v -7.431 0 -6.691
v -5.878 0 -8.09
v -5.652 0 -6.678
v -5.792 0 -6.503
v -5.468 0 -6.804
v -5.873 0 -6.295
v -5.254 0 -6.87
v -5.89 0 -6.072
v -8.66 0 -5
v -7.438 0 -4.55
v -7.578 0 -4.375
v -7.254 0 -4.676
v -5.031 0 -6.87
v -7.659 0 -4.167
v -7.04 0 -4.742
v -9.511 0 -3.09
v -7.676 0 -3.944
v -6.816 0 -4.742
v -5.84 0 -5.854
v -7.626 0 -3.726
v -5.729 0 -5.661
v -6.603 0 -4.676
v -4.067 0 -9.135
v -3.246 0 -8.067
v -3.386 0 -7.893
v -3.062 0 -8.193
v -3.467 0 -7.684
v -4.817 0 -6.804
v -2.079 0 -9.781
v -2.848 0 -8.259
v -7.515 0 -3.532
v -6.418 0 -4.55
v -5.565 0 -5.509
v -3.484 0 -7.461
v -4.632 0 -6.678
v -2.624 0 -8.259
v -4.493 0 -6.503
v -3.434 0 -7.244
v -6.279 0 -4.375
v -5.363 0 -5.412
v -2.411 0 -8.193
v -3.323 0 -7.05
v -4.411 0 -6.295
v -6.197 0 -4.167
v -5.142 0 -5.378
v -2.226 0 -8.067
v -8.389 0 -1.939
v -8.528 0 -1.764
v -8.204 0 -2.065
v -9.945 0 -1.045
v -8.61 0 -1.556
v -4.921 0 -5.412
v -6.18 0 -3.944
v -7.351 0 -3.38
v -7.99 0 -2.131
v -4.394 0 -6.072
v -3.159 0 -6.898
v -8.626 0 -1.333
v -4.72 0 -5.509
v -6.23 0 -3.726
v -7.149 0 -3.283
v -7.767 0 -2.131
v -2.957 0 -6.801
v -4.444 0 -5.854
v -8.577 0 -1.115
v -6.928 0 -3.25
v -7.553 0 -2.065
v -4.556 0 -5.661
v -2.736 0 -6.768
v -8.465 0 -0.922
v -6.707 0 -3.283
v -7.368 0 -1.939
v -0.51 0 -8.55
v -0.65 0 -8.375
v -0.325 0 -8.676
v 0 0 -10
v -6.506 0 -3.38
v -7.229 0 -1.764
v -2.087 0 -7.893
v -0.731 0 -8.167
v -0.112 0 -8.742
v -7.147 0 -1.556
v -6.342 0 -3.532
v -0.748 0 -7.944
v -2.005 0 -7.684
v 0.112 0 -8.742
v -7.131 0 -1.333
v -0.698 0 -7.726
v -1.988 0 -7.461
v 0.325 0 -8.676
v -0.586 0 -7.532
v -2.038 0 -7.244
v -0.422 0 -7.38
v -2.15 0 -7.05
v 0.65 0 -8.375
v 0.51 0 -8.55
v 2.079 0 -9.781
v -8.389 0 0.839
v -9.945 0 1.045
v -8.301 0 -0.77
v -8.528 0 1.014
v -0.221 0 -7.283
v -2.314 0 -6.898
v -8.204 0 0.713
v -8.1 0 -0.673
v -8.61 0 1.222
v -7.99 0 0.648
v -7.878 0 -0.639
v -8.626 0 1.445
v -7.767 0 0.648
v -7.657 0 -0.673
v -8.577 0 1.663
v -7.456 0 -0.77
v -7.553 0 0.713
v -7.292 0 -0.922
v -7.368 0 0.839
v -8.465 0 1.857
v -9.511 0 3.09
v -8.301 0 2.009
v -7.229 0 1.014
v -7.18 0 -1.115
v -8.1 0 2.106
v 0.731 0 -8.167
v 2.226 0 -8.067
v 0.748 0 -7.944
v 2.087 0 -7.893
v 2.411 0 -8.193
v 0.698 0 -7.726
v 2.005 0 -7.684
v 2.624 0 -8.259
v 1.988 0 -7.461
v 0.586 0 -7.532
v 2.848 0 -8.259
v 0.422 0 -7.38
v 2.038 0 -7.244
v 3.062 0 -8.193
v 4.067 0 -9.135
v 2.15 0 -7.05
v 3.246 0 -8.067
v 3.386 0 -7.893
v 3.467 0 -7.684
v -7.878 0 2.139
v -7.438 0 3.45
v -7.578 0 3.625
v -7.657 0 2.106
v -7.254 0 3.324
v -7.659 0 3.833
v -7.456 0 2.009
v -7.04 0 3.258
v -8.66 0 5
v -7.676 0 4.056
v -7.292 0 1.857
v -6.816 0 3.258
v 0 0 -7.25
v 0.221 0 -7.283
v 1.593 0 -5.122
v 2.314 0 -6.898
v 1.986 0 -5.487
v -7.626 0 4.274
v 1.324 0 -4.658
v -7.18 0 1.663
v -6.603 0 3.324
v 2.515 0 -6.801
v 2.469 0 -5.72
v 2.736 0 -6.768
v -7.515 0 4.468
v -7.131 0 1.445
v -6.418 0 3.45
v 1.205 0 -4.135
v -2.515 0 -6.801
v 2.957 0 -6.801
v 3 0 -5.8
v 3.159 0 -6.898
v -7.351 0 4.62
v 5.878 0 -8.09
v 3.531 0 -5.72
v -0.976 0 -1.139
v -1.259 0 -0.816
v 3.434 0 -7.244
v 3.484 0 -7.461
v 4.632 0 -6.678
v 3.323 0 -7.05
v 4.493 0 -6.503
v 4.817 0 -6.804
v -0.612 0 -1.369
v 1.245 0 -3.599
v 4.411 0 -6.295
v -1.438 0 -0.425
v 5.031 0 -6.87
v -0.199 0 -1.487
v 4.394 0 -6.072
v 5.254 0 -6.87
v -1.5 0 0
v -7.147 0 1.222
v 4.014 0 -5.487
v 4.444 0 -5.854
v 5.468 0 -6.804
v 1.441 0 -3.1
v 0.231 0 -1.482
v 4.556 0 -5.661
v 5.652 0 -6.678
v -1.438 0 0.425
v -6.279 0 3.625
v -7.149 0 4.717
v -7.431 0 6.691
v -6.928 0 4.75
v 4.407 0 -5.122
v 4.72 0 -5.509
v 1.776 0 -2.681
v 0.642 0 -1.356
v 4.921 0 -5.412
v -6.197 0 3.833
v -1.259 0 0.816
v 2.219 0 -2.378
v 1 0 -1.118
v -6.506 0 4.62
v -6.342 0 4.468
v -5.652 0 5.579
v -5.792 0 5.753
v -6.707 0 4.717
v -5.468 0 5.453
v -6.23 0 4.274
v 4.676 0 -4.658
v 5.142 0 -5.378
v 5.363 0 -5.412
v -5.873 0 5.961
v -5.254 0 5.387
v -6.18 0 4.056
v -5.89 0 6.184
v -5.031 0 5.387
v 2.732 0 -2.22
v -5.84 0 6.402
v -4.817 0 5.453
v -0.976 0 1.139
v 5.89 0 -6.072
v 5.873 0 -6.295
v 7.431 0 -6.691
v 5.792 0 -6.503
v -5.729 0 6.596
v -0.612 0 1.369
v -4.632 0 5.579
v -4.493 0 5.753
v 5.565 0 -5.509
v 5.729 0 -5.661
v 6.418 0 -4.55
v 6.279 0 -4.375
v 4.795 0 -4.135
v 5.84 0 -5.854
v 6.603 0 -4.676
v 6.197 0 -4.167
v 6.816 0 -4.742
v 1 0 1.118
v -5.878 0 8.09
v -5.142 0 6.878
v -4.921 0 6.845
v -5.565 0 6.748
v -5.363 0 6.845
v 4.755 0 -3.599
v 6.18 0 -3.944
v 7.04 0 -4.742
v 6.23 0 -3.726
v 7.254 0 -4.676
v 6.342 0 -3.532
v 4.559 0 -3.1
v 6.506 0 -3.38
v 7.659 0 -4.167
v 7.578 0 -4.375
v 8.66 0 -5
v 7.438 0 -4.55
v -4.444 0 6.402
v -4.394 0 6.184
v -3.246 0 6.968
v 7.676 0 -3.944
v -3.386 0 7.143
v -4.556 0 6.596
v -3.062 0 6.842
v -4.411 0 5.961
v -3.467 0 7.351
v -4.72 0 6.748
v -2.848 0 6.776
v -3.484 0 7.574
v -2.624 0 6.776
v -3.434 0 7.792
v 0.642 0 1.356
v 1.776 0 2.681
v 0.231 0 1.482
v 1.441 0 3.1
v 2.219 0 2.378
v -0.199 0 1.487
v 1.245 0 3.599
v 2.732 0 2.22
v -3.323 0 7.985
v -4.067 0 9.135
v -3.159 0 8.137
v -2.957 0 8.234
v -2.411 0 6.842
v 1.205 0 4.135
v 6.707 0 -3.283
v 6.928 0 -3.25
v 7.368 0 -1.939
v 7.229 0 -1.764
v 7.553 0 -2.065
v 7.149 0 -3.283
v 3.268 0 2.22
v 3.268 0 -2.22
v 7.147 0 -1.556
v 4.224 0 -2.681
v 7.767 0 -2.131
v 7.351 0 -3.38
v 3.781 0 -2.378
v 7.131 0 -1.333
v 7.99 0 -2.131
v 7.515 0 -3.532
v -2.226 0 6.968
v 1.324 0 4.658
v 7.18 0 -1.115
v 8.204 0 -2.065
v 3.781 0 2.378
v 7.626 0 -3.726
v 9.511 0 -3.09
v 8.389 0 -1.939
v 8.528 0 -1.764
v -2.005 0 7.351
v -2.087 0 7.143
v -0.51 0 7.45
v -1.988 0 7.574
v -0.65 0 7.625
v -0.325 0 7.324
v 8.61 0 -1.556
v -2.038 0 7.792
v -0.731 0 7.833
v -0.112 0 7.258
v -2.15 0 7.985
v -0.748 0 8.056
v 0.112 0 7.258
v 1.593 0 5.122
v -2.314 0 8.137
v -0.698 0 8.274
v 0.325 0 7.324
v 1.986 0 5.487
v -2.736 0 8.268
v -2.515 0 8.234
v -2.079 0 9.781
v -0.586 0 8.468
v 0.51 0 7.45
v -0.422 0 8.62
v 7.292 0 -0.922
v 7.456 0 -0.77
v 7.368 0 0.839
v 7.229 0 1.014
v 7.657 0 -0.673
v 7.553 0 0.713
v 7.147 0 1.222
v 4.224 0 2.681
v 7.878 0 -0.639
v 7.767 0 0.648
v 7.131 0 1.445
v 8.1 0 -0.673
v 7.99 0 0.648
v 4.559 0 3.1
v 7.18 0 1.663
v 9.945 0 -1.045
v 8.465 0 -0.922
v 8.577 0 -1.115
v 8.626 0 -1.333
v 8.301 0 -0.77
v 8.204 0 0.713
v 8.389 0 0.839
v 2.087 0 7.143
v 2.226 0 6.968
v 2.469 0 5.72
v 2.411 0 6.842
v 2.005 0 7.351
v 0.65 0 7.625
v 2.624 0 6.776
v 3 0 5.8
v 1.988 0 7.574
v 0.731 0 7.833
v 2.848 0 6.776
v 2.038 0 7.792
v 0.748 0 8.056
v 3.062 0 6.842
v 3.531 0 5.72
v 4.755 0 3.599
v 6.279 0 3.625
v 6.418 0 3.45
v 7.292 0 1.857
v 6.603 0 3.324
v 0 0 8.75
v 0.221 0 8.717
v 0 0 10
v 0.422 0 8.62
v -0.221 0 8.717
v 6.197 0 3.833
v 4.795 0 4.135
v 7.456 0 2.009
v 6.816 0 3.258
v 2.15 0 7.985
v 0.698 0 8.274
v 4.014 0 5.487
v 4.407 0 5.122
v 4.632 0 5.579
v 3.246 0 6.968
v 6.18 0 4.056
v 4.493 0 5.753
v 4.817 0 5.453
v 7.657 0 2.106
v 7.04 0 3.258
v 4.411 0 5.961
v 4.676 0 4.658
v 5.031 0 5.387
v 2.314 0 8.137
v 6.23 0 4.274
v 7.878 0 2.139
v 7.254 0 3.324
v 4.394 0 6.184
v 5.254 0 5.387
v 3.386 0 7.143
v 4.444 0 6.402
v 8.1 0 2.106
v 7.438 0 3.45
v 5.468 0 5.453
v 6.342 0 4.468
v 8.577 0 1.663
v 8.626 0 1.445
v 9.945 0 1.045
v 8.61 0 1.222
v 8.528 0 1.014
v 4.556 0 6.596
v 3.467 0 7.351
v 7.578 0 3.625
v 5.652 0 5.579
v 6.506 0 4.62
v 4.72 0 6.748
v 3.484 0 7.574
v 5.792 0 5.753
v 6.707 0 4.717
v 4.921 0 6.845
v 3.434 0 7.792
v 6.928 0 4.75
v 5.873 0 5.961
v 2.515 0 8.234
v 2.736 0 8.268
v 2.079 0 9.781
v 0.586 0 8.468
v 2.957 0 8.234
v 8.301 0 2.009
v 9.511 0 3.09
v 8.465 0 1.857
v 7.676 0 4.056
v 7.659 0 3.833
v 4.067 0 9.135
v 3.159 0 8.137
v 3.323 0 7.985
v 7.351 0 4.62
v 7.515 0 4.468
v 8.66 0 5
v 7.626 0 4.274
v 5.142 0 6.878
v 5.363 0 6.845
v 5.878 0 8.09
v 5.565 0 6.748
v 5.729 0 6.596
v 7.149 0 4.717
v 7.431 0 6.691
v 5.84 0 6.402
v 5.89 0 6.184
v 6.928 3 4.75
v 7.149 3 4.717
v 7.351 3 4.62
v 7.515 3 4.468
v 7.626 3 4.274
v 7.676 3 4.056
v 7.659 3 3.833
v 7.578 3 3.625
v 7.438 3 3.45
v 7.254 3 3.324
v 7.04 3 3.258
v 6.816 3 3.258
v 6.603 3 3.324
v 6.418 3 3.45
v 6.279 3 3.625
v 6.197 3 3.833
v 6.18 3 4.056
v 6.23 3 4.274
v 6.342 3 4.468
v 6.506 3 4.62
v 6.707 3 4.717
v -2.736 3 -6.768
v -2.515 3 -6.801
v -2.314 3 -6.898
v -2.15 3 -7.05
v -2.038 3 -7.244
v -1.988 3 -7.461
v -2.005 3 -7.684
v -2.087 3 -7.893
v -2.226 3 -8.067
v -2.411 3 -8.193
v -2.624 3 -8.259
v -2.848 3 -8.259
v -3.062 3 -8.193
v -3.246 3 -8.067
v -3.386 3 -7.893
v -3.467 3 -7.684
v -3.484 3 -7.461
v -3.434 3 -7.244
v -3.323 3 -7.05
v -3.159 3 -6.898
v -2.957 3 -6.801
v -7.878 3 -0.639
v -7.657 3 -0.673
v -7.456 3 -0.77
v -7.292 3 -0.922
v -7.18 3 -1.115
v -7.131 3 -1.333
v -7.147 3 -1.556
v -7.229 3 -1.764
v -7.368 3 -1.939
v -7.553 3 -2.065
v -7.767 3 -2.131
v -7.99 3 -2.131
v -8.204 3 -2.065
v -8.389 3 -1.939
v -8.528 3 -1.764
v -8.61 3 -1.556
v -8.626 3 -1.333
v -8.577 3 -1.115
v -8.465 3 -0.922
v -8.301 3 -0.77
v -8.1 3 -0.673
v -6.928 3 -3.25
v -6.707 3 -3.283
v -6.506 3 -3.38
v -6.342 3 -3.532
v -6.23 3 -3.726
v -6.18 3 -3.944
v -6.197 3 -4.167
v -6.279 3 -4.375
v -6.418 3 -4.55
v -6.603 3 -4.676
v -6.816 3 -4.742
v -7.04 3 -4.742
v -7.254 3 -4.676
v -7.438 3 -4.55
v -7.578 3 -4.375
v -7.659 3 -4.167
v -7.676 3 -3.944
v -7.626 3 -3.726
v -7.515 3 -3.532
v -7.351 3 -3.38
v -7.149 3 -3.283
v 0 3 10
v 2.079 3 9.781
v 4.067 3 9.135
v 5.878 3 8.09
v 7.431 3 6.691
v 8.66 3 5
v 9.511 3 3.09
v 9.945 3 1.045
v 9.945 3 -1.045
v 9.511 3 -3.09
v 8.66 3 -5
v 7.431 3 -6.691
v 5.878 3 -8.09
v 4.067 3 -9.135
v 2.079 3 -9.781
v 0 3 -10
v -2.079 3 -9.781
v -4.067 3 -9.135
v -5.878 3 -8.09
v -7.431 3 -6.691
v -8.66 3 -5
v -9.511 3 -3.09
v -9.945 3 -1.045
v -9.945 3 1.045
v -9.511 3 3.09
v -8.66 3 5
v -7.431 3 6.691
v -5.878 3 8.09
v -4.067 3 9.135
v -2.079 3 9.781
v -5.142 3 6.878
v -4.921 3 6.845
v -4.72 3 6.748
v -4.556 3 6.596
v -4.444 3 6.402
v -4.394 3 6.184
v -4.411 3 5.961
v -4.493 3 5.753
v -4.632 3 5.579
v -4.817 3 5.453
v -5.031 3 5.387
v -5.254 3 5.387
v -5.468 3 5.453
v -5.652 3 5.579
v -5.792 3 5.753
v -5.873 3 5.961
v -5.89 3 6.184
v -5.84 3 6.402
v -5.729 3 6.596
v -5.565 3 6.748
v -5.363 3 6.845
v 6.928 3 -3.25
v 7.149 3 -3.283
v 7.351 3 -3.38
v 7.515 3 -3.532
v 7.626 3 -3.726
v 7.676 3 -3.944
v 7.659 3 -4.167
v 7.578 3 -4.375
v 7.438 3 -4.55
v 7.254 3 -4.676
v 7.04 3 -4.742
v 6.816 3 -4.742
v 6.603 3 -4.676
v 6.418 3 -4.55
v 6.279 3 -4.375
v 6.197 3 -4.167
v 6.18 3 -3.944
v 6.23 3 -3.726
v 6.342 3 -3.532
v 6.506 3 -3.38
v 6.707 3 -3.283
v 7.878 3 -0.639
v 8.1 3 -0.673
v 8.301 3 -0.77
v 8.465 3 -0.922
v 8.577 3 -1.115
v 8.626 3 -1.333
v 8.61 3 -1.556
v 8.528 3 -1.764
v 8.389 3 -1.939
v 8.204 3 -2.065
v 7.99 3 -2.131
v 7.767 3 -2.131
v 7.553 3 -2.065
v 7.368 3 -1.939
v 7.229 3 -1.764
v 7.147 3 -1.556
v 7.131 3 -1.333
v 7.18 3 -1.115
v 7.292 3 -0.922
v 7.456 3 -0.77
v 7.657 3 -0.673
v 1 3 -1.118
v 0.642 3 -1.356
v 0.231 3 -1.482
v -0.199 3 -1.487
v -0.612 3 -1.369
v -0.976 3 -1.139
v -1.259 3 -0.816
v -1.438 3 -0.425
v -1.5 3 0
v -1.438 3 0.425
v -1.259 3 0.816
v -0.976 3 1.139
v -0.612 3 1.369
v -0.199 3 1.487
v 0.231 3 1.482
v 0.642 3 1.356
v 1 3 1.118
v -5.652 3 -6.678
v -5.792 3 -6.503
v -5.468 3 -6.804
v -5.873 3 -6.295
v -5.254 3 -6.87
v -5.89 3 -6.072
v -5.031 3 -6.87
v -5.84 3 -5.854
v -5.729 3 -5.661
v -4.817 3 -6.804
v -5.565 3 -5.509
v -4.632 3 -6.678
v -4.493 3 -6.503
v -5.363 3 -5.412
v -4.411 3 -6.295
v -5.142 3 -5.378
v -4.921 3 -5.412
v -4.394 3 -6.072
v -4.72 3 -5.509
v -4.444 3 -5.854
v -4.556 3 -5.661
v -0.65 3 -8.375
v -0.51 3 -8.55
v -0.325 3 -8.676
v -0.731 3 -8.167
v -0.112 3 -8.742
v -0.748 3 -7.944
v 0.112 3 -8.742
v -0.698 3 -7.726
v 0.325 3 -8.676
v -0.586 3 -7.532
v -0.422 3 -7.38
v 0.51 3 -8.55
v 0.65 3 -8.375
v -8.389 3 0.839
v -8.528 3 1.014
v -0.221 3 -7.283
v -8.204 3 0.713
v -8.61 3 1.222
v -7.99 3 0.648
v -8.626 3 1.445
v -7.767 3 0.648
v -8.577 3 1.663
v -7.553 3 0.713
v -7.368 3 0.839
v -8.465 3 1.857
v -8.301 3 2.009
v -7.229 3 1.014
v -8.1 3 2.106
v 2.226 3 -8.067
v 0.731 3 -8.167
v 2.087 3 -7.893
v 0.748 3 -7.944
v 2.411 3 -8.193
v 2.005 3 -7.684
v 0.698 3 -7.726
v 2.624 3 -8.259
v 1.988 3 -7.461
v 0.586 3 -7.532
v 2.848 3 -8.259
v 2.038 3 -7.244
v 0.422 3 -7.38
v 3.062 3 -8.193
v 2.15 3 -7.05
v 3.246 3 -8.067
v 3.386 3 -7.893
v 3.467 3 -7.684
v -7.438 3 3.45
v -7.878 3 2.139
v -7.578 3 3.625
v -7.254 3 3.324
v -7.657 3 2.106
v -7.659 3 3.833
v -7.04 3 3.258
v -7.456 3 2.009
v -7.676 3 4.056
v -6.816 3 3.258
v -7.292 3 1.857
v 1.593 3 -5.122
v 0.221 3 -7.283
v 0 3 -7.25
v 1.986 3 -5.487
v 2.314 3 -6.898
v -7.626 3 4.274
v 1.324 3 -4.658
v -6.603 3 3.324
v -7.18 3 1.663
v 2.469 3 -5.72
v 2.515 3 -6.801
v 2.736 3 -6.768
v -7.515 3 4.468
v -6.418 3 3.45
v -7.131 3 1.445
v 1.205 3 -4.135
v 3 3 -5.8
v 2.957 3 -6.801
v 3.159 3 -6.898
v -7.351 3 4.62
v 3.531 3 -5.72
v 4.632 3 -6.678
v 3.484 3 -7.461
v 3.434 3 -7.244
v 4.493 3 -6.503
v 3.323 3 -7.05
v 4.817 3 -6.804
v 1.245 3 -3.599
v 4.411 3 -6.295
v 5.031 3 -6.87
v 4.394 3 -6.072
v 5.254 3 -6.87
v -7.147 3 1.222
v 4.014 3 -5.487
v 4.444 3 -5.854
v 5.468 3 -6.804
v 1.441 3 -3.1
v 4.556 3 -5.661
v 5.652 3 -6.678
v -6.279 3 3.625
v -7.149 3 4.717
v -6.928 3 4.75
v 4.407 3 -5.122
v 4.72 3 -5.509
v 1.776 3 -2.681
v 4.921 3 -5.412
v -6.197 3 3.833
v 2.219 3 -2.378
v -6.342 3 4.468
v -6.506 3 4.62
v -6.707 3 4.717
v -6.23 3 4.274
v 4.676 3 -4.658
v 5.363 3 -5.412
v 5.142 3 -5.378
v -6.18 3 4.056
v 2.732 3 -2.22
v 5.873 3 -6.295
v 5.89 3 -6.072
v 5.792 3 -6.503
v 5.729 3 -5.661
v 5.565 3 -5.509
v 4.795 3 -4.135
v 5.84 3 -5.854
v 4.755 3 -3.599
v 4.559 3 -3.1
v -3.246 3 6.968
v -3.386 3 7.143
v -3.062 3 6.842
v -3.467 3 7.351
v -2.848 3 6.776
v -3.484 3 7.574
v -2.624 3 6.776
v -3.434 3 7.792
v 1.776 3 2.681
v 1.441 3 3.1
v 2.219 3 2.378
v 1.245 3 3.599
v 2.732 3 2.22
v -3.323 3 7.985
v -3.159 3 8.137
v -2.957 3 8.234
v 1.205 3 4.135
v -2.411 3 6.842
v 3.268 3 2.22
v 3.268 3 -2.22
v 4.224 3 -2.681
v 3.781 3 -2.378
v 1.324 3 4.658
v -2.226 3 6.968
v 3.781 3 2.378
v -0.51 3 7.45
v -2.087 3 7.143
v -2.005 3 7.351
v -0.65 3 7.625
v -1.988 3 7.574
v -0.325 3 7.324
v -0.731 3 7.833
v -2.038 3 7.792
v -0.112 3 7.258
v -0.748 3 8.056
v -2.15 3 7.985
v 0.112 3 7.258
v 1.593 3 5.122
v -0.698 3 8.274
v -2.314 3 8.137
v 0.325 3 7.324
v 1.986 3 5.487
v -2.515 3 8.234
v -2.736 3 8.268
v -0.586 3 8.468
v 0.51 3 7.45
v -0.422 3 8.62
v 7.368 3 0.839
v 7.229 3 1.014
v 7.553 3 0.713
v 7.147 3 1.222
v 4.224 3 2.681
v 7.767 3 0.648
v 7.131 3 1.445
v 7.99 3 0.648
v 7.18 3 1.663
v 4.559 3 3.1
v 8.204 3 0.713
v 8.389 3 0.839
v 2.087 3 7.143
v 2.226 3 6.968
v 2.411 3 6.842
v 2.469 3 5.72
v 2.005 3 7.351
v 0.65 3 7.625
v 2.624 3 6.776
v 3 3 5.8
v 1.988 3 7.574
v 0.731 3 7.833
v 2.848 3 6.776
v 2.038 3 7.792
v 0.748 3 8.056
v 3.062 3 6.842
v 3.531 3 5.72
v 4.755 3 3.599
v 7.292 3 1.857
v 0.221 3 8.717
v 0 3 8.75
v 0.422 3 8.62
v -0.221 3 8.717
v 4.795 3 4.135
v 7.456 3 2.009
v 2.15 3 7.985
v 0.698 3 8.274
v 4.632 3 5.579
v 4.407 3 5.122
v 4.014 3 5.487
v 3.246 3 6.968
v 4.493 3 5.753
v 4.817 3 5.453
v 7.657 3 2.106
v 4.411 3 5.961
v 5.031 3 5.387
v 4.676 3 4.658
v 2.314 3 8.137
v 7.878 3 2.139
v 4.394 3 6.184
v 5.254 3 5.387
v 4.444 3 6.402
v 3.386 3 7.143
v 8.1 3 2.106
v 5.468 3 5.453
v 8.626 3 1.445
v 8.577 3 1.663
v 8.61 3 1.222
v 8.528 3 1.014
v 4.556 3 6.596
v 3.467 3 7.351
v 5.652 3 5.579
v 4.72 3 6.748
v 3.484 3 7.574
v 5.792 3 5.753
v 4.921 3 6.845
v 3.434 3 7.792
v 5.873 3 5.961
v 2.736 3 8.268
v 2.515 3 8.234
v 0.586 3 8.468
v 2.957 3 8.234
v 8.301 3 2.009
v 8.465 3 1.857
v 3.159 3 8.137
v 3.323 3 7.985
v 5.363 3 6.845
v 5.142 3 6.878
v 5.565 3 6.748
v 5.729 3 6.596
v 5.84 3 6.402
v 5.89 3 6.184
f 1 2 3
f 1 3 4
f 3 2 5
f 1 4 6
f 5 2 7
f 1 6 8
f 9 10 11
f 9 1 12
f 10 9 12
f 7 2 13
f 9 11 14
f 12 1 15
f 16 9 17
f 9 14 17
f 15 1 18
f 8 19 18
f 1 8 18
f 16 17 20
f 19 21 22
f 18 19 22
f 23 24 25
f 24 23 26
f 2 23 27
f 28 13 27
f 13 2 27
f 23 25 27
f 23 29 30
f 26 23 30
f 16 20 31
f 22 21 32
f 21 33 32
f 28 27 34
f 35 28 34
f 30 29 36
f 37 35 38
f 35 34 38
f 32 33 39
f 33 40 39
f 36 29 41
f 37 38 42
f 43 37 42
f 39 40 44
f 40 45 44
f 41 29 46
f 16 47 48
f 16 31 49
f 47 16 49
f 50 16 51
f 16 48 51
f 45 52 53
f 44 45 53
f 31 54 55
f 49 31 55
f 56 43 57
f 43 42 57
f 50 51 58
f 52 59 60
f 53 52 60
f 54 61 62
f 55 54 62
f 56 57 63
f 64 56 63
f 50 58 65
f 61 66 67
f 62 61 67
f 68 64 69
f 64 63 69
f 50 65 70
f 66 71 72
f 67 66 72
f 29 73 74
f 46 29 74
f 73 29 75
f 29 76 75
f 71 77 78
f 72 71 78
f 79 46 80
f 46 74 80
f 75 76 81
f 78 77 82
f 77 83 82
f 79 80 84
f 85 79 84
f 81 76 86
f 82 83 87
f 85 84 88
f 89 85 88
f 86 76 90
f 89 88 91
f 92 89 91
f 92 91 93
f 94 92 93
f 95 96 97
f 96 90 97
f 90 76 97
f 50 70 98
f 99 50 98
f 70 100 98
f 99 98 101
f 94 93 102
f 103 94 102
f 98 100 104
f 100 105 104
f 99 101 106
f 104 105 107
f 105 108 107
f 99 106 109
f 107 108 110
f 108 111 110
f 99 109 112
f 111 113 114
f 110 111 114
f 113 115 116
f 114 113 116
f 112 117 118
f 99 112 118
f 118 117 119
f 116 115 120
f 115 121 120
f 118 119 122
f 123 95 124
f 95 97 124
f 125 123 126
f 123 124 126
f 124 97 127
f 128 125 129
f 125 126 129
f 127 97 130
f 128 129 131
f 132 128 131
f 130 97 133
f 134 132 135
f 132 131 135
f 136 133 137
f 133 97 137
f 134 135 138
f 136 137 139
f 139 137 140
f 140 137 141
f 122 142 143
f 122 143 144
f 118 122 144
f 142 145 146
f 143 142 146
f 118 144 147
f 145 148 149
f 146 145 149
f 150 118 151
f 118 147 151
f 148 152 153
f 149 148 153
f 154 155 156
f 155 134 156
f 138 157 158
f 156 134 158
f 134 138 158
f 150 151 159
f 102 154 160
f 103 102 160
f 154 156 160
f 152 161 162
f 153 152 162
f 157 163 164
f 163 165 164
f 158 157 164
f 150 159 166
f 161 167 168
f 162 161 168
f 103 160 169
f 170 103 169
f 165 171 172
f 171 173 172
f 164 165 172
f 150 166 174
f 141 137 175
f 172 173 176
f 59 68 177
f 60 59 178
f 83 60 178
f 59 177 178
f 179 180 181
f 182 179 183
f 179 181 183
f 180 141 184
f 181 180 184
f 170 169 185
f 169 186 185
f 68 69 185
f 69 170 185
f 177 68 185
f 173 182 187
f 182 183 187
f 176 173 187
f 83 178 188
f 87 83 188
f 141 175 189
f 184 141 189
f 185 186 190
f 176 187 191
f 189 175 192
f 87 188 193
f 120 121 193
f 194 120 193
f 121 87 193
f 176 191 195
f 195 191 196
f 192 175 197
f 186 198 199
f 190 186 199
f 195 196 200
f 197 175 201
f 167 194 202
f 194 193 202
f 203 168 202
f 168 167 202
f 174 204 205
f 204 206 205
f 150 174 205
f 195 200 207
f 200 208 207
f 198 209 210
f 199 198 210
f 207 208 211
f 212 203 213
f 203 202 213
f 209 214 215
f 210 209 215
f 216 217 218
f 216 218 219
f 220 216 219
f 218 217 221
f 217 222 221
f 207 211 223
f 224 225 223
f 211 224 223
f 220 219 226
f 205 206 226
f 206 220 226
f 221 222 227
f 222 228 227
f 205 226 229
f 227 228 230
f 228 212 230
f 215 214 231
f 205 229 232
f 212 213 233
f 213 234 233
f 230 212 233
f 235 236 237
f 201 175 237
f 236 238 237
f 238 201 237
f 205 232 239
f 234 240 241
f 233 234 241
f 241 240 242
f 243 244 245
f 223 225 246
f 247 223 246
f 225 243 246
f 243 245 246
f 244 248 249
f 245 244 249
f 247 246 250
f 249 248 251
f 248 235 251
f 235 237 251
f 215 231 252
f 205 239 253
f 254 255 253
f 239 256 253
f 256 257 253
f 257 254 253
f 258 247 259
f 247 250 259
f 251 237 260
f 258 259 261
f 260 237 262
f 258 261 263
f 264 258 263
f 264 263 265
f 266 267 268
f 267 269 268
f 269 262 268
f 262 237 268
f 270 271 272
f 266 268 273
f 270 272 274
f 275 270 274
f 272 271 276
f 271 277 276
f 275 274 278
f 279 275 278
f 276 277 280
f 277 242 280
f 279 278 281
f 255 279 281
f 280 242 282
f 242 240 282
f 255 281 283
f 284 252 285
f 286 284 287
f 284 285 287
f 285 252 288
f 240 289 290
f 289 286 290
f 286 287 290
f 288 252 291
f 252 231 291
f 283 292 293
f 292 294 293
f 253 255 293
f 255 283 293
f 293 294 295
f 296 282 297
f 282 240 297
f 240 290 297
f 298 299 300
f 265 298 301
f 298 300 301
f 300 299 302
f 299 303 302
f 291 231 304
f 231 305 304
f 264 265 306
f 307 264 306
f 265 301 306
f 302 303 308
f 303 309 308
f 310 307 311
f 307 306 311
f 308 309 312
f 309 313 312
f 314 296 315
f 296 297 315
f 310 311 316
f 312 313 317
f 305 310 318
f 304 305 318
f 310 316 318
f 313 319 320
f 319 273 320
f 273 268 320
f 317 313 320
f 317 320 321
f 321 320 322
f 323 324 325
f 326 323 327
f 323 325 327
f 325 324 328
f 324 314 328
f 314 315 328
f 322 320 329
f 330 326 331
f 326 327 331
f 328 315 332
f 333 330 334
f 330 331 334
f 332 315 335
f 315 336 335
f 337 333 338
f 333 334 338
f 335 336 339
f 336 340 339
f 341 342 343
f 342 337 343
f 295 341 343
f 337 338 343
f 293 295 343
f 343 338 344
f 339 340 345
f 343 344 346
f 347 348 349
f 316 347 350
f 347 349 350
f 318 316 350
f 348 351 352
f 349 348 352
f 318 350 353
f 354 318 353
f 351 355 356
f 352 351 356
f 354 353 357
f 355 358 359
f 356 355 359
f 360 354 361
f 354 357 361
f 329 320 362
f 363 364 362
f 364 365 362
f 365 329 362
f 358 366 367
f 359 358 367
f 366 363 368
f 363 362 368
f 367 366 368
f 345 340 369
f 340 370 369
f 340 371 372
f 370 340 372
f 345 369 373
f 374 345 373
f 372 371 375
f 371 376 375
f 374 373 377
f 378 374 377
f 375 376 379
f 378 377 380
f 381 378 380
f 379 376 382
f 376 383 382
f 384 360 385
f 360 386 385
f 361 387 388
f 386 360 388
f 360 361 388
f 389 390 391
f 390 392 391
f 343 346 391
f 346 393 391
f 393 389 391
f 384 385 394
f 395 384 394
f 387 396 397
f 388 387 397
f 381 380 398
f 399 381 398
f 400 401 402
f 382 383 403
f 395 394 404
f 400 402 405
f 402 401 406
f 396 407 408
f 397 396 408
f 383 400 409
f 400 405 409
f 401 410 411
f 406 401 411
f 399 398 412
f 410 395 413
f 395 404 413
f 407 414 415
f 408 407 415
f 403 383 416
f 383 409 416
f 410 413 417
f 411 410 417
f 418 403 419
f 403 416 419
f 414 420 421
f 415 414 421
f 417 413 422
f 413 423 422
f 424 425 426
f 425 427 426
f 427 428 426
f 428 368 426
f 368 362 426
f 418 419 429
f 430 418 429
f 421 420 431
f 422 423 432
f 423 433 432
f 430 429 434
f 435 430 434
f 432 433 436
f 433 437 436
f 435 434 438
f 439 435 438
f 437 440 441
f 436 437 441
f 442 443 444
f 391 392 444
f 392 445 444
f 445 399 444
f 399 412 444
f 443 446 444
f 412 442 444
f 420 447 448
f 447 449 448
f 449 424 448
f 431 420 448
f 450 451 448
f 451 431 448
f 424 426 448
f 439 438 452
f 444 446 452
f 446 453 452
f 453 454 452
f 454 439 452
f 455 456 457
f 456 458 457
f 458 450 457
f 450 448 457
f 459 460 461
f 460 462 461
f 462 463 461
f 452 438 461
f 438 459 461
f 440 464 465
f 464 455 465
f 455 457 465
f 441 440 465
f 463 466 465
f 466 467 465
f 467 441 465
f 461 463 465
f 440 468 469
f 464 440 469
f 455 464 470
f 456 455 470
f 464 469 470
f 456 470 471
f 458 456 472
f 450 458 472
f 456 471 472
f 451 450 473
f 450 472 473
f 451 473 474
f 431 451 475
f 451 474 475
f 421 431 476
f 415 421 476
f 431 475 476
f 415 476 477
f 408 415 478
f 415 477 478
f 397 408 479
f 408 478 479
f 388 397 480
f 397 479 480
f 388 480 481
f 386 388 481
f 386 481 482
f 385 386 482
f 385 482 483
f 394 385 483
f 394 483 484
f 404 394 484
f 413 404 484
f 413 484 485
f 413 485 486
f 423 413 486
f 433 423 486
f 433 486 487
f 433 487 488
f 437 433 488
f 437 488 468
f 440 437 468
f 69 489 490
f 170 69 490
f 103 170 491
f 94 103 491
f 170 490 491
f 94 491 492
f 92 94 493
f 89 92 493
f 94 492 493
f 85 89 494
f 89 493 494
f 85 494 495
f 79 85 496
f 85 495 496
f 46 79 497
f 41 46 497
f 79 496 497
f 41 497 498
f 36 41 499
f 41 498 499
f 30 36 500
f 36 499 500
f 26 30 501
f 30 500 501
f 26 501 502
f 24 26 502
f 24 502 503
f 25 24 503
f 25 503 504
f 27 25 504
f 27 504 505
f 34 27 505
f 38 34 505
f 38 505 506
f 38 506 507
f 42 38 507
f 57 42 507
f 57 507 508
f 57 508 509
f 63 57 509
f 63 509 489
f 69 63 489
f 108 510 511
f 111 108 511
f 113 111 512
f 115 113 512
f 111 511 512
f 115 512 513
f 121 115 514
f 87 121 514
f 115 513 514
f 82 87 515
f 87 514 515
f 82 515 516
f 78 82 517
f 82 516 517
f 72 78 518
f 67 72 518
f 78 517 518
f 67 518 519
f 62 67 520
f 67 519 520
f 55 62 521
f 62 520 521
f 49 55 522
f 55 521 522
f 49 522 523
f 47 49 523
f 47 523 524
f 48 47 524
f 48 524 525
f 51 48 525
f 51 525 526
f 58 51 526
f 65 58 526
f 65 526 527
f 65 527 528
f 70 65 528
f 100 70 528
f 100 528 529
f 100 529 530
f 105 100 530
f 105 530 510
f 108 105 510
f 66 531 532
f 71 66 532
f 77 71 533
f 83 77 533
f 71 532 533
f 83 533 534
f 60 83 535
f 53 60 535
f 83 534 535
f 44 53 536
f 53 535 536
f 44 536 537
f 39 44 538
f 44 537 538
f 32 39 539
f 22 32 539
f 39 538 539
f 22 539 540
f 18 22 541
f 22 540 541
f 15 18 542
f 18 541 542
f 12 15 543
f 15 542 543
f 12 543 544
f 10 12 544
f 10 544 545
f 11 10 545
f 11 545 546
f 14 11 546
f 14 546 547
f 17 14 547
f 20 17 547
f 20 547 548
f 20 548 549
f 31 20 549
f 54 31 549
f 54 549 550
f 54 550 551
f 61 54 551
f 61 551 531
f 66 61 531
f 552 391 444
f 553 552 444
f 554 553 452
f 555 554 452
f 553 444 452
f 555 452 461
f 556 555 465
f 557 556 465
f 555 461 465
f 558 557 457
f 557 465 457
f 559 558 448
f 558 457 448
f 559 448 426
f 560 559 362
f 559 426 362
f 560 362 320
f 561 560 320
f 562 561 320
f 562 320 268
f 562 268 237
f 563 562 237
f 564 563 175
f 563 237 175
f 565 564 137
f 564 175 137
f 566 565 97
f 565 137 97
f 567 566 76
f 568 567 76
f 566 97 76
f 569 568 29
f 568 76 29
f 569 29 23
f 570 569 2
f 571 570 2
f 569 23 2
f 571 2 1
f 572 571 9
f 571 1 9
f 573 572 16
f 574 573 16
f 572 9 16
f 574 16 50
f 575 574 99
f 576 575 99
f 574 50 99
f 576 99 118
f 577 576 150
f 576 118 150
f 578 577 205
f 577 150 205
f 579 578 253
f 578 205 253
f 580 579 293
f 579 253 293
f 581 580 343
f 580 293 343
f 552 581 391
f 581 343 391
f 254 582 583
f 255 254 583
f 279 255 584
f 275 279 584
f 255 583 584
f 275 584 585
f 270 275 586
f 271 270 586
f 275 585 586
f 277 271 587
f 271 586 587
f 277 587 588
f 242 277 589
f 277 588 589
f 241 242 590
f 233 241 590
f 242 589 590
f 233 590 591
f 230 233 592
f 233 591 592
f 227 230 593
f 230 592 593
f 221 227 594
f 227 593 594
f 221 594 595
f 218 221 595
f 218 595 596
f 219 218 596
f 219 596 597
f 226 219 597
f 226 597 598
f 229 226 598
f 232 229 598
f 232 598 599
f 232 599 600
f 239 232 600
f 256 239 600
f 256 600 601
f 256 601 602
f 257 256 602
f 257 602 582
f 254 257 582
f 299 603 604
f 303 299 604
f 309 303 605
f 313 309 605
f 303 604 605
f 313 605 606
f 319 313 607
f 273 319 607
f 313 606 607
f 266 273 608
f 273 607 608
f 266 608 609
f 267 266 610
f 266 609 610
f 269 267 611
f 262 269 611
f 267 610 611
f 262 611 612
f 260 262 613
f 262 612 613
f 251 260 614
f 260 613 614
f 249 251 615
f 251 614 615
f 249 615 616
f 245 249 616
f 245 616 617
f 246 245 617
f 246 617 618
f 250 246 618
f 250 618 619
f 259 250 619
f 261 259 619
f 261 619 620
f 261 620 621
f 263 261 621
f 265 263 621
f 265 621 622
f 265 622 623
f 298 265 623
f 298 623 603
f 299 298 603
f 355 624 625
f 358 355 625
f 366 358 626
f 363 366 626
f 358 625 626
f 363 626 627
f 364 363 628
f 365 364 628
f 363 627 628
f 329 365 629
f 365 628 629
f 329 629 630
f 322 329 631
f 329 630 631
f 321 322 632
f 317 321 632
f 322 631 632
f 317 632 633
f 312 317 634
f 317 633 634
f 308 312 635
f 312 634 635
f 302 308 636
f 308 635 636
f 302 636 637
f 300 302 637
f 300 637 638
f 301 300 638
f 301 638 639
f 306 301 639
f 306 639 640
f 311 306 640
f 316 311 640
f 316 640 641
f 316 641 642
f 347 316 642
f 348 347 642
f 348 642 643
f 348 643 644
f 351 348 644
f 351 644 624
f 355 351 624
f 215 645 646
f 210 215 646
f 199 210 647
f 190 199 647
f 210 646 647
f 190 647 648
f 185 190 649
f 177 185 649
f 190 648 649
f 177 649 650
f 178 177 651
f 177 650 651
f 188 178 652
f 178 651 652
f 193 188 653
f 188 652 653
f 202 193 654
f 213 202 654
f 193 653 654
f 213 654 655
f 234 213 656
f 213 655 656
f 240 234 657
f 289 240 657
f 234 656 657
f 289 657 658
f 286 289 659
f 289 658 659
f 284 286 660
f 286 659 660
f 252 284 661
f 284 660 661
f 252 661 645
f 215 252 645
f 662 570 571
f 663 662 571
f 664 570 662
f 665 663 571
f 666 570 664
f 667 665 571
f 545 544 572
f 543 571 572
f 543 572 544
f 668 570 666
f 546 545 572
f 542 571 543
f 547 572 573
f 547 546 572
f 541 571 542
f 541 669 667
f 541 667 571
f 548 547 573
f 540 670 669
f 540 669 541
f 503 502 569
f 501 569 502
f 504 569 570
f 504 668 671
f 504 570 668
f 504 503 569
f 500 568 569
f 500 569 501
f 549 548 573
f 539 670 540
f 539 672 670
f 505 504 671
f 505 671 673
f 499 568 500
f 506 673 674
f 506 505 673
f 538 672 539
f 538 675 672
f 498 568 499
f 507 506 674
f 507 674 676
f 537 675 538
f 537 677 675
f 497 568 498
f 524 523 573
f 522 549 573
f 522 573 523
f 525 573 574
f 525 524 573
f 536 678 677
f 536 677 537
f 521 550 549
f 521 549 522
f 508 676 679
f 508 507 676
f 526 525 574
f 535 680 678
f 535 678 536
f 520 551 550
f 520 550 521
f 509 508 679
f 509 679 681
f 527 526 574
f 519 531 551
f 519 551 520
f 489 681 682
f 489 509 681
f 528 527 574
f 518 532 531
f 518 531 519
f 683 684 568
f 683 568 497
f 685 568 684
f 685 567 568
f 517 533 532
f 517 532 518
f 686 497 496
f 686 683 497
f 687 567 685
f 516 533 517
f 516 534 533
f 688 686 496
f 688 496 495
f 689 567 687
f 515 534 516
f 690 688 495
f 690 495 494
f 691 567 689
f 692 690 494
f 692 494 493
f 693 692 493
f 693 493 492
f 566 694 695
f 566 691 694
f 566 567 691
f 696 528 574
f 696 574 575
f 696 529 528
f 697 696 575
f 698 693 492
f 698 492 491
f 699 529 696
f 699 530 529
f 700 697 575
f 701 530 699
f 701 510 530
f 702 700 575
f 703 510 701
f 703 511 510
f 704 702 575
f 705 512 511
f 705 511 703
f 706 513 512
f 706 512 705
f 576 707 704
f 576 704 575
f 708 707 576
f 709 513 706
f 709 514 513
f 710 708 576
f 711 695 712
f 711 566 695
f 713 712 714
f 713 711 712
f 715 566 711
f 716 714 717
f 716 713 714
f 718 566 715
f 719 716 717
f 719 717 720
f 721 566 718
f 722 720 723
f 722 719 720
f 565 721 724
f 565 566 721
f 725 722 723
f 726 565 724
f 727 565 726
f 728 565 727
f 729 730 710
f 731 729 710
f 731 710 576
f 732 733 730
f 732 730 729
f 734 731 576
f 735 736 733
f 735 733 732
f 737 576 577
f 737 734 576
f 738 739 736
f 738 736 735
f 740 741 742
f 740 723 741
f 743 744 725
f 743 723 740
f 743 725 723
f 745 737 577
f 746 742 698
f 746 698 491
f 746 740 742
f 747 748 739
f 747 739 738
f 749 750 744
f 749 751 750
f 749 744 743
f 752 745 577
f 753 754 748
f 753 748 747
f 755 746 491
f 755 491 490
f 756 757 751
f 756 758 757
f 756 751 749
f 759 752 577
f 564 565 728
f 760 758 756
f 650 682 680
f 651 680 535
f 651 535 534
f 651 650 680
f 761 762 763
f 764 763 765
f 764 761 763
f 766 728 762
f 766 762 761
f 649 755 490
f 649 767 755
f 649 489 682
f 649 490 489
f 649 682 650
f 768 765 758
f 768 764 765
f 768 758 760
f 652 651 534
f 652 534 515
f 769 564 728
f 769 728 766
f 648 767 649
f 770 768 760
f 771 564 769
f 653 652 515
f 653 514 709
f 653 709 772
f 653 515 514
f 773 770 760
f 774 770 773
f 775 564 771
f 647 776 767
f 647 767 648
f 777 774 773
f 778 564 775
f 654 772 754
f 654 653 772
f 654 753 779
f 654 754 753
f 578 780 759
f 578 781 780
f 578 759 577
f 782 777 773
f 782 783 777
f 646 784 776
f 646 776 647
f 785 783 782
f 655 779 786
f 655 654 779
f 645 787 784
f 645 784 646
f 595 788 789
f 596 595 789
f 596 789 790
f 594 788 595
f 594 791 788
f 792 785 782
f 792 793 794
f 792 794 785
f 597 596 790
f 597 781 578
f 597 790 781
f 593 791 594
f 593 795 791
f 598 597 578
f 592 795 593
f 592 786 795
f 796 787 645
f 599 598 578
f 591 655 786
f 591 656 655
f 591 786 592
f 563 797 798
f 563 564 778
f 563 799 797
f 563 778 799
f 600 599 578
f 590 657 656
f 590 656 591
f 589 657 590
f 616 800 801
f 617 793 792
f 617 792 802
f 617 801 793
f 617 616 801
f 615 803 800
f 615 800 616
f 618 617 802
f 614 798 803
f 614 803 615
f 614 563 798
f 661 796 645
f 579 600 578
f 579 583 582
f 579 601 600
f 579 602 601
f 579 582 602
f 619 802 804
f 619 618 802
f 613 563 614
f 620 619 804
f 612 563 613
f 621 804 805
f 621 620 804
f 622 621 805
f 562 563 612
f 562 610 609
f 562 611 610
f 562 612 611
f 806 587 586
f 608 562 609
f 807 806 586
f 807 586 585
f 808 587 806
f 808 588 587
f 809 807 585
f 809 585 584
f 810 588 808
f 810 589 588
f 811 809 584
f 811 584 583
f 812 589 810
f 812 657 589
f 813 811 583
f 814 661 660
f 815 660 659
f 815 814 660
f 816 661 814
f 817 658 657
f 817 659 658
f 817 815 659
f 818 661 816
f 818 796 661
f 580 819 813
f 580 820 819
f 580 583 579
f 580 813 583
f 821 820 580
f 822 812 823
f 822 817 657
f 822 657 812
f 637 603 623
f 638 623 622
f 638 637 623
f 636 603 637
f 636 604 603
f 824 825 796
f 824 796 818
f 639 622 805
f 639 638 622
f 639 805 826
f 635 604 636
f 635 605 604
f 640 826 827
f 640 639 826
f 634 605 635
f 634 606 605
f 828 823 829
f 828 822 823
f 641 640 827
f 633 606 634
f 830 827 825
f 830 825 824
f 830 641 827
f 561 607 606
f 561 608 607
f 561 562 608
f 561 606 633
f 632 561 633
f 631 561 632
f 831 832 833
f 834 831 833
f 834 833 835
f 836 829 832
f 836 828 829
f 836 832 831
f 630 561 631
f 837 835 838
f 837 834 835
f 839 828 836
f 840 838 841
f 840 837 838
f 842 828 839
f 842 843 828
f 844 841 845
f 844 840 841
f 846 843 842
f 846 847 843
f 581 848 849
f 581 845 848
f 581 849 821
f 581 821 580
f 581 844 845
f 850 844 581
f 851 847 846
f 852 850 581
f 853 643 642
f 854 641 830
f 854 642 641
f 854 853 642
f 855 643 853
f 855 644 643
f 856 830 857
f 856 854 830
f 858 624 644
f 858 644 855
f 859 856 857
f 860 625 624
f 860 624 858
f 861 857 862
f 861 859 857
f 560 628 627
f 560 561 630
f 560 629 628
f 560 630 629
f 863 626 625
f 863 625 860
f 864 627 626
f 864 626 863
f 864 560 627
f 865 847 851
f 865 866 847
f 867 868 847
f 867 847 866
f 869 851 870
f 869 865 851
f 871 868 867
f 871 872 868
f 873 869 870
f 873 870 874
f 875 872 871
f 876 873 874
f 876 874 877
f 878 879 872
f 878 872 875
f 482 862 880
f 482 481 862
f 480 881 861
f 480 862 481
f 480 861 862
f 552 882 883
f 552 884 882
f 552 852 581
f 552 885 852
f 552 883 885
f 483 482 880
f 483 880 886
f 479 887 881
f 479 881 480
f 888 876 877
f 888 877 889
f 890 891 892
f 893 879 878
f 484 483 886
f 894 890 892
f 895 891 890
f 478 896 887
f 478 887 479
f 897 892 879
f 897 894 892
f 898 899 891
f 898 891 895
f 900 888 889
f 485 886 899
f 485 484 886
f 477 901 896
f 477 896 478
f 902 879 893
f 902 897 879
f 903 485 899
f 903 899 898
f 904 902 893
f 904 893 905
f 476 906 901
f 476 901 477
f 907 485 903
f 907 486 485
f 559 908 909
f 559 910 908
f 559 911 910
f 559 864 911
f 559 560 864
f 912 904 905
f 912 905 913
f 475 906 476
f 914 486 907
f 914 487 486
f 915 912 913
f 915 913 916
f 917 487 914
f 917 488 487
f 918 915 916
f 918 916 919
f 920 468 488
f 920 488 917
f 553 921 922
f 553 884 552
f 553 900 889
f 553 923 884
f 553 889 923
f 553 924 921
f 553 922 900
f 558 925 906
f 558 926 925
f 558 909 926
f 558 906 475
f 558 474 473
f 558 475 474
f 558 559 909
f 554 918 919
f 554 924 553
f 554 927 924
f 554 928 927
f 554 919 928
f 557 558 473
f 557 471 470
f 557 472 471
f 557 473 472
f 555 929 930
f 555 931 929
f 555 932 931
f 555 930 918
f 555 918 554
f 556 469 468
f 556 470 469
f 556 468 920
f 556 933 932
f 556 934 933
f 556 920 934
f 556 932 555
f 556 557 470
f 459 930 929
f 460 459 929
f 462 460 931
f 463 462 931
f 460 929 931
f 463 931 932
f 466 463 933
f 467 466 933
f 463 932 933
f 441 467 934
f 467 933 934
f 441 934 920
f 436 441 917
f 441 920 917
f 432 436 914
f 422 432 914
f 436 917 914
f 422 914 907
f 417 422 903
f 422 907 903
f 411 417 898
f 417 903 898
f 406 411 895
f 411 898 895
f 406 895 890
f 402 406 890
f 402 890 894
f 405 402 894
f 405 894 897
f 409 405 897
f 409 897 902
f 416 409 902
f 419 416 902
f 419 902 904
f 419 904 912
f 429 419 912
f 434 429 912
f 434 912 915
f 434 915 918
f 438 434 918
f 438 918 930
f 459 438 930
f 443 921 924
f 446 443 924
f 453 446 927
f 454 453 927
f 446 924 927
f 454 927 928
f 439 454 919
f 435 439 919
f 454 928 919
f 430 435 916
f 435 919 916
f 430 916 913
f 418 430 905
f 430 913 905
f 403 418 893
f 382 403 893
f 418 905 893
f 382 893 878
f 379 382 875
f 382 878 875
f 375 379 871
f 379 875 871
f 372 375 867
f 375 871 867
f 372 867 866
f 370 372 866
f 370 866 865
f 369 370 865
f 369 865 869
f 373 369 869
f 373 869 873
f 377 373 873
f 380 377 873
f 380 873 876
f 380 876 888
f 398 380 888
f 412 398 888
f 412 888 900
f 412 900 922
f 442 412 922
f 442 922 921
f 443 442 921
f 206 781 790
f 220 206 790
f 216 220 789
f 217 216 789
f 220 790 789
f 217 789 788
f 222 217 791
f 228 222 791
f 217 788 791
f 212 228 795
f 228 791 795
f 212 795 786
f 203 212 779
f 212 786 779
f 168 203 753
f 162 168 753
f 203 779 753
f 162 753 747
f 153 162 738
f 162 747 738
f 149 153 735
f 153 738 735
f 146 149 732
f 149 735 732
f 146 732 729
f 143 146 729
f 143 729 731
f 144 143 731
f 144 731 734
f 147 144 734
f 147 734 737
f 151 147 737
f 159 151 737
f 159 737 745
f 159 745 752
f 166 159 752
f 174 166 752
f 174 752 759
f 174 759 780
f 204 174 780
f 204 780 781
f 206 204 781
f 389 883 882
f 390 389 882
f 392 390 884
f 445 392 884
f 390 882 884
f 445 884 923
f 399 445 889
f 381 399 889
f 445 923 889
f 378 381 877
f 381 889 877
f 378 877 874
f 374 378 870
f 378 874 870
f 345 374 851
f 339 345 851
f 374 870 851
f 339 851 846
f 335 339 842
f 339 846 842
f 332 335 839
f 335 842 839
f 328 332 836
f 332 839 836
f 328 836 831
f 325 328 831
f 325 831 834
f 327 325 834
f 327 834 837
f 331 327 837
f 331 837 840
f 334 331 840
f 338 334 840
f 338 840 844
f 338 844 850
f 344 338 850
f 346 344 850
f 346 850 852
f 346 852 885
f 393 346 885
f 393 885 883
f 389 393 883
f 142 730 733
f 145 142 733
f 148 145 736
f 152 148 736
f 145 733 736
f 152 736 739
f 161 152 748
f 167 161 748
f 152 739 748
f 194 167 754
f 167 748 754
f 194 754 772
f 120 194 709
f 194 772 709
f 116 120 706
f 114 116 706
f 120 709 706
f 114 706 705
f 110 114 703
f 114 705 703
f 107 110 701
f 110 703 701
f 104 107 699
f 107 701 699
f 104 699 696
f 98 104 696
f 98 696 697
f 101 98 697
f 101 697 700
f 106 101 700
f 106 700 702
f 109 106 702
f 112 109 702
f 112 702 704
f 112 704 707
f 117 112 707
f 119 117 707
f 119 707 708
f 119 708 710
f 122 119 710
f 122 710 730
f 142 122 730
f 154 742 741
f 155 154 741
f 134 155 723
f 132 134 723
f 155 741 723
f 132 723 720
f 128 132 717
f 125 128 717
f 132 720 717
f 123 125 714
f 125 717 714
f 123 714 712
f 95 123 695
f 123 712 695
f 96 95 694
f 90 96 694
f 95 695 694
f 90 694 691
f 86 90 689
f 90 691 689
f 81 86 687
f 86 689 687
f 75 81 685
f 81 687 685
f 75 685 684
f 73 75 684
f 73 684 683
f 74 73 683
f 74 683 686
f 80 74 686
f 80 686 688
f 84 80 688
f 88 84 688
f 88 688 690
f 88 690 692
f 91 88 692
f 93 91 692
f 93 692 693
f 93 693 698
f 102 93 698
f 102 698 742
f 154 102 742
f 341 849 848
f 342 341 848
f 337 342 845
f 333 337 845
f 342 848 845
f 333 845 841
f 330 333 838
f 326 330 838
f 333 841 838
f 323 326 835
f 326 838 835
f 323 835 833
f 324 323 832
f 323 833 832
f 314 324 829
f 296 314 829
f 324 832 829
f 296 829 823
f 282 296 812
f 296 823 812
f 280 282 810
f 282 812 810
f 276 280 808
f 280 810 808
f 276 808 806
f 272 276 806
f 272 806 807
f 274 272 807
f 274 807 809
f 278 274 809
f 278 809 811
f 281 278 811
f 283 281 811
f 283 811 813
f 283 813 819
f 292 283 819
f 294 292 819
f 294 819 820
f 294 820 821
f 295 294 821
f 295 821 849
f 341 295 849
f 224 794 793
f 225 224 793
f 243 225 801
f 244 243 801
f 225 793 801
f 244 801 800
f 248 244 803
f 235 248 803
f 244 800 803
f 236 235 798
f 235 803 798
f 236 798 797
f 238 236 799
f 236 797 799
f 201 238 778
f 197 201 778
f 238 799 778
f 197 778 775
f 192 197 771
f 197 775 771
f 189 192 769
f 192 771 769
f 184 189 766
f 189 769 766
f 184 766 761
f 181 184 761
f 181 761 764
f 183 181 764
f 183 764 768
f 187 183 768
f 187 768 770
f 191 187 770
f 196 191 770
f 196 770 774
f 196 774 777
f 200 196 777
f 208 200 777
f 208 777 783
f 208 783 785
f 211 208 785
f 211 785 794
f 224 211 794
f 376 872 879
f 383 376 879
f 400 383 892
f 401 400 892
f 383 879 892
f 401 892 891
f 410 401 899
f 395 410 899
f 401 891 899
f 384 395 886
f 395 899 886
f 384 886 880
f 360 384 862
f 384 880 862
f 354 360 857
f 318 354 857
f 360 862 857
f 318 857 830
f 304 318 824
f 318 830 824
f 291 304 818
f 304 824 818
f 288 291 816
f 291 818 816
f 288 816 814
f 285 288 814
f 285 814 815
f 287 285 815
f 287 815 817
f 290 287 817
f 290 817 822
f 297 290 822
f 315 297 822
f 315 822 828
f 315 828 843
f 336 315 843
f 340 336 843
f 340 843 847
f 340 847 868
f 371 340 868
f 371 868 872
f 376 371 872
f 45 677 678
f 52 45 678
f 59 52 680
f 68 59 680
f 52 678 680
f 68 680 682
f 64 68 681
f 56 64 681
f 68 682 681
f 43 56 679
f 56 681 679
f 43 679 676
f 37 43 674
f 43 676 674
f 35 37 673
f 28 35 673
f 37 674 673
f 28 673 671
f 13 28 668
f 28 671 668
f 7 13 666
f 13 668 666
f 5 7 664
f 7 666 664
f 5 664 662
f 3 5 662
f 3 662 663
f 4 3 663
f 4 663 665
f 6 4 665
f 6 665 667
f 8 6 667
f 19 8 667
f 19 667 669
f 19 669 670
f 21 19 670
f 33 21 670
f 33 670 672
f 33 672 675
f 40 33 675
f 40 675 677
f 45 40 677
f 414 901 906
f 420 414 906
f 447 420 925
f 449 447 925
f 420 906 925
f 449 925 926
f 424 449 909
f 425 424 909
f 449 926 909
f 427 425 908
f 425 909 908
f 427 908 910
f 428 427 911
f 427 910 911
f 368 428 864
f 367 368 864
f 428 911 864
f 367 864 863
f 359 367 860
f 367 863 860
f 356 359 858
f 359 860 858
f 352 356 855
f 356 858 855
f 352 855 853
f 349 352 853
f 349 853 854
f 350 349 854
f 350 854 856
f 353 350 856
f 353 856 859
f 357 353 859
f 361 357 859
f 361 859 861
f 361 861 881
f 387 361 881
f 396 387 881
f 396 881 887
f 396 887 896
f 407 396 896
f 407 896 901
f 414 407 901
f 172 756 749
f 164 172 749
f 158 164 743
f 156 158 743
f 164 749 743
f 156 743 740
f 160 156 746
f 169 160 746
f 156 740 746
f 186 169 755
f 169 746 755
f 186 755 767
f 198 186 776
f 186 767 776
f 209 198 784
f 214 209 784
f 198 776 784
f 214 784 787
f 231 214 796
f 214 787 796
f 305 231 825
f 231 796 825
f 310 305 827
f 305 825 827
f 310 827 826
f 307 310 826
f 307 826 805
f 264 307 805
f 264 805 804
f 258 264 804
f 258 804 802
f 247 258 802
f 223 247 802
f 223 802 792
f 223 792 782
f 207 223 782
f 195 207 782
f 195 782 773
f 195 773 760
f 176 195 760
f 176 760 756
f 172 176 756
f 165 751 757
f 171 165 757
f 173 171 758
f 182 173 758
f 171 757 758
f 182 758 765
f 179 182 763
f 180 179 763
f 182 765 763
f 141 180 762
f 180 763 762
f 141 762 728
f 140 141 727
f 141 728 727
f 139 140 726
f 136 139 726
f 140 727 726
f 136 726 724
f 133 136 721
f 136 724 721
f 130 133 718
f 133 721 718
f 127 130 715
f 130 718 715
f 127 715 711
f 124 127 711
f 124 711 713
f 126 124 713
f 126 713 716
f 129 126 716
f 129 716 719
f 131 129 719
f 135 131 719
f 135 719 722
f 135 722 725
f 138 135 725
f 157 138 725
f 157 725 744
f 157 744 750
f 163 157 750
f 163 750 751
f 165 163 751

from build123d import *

# Parameters (mm, degrees)
SKETCH_1_R          = 10
EXTRUDE_1_DEPTH     = 3
SKETCH_3_R          = 0.75
CUT_EXTRUDE_2_DEPTH = 15.456832295
SKETCH_4_R          = 1.8
CUT_EXTRUDE_3_DEPTH = 15.456832295
CUT_EXTRUDE_6_REACH = 16.457


with BuildPart() as part:
    # 草图1 → 凸台-拉伸1 (new body)
    with BuildSketch(Plane(origin=(0, 0, 0), x_dir=(1, 0, 0), z_dir=(0, 1, 0))):
        with Locations(Location((0, 0, 0), (0, 0, 270))):
            Circle(SKETCH_1_R)
    extrude(amount=EXTRUDE_1_DEPTH)

    # 草图3 → 切除-拉伸2 (cut, through all)
    with BuildSketch(Plane(origin=(0, 3, 0), x_dir=(1, 0, 0), z_dir=(0, 1, 0))):
        with Locations(Location((0, 8, 0), (0, 0, 270))):
            Circle(SKETCH_3_R)
        with Locations(Location((2.736161147, 7.517540966, 0), (0, 0, 270))):
            Circle(SKETCH_3_R)
        with Locations(Location((5.142300877, 6.128355545, 0), (0, 0, 270))):
            Circle(SKETCH_3_R)
        with Locations(Location((6.92820323, 4, 0), (0, 0, 270))):
            Circle(SKETCH_3_R)
        with Locations(Location((7.878462024, 1.389185421, 0), (0, 0, 270))):
            Circle(SKETCH_3_R)
        with Locations(Location((7.878462024, -1.389185421, 0), (0, 0, 270))):
            Circle(SKETCH_3_R)
        with Locations(Location((6.92820323, -4, 0), (0, 0, 270))):
            Circle(SKETCH_3_R)
        with Locations(Location((5.142300877, -6.128355545, 0), (0, 0, 270))):
            Circle(SKETCH_3_R)
        with Locations(Location((2.736161147, -7.517540966, 0), (0, 0, 270))):
            Circle(SKETCH_3_R)
        with Locations(Location((0, -8, 0), (0, 0, 270))):
            Circle(SKETCH_3_R)
        with Locations(Location((-2.736161147, -7.517540966, 0), (0, 0, 270))):
            Circle(SKETCH_3_R)
        with Locations(Location((-5.142300877, -6.128355545, 0), (0, 0, 270))):
            Circle(SKETCH_3_R)
        with Locations(Location((-6.92820323, -4, 0), (0, 0, 270))):
            Circle(SKETCH_3_R)
        with Locations(Location((-7.878462024, -1.389185421, 0), (0, 0, 270))):
            Circle(SKETCH_3_R)
        with Locations(Location((-7.878462024, 1.389185421, 0), (0, 0, 270))):
            Circle(SKETCH_3_R)
        with Locations(Location((-6.92820323, 4, 0), (0, 0, 270))):
            Circle(SKETCH_3_R)
        with Locations(Location((-5.142300877, 6.128355545, 0), (0, 0, 270))):
            Circle(SKETCH_3_R)
        with Locations(Location((-2.736161147, 7.517540966, 0), (0, 0, 270))):
            Circle(SKETCH_3_R)
    extrude(amount=-CUT_EXTRUDE_2_DEPTH, mode=Mode.SUBTRACT)

    # 草图4 → 切除-拉伸3 (cut, through all)
    with BuildSketch(Plane(origin=(0, 3, 0), x_dir=(1, 0, 0), z_dir=(0, 1, 0))):
        with Locations(Location((3, -4, 0), (0, 0, 270))):
            Circle(SKETCH_4_R)
        with Locations(Location((3, 4, 0), (0, 0, 90))):
            Circle(SKETCH_4_R)
    extrude(amount=-CUT_EXTRUDE_3_DEPTH, mode=Mode.SUBTRACT)

    # 草图2 → 切除-拉伸6 (cut, up to next)
    with BuildSketch(Plane(origin=(0, 3, 0), x_dir=(1, 0, 0), z_dir=(0, 1, 0)), mode=Mode.PRIVATE) as cut_extrude_6_sk1:
        with BuildLine():
            Line((1, -1.118033989), (1, 1.118033989))
            ThreePointArc((1, 1.118033989), (-1.5, 0), (1, -1.118033989))
        make_face()
    cut_extrude_6_tool1 = extrude(cut_extrude_6_sk1.sketch, amount=-CUT_EXTRUDE_6_REACH, mode=Mode.PRIVATE) & part.part
    add(cut_extrude_6_tool1.solids().sort_by_distance((-0.148024, 3, 0))[0], mode=Mode.SUBTRACT)


solid = part.part
